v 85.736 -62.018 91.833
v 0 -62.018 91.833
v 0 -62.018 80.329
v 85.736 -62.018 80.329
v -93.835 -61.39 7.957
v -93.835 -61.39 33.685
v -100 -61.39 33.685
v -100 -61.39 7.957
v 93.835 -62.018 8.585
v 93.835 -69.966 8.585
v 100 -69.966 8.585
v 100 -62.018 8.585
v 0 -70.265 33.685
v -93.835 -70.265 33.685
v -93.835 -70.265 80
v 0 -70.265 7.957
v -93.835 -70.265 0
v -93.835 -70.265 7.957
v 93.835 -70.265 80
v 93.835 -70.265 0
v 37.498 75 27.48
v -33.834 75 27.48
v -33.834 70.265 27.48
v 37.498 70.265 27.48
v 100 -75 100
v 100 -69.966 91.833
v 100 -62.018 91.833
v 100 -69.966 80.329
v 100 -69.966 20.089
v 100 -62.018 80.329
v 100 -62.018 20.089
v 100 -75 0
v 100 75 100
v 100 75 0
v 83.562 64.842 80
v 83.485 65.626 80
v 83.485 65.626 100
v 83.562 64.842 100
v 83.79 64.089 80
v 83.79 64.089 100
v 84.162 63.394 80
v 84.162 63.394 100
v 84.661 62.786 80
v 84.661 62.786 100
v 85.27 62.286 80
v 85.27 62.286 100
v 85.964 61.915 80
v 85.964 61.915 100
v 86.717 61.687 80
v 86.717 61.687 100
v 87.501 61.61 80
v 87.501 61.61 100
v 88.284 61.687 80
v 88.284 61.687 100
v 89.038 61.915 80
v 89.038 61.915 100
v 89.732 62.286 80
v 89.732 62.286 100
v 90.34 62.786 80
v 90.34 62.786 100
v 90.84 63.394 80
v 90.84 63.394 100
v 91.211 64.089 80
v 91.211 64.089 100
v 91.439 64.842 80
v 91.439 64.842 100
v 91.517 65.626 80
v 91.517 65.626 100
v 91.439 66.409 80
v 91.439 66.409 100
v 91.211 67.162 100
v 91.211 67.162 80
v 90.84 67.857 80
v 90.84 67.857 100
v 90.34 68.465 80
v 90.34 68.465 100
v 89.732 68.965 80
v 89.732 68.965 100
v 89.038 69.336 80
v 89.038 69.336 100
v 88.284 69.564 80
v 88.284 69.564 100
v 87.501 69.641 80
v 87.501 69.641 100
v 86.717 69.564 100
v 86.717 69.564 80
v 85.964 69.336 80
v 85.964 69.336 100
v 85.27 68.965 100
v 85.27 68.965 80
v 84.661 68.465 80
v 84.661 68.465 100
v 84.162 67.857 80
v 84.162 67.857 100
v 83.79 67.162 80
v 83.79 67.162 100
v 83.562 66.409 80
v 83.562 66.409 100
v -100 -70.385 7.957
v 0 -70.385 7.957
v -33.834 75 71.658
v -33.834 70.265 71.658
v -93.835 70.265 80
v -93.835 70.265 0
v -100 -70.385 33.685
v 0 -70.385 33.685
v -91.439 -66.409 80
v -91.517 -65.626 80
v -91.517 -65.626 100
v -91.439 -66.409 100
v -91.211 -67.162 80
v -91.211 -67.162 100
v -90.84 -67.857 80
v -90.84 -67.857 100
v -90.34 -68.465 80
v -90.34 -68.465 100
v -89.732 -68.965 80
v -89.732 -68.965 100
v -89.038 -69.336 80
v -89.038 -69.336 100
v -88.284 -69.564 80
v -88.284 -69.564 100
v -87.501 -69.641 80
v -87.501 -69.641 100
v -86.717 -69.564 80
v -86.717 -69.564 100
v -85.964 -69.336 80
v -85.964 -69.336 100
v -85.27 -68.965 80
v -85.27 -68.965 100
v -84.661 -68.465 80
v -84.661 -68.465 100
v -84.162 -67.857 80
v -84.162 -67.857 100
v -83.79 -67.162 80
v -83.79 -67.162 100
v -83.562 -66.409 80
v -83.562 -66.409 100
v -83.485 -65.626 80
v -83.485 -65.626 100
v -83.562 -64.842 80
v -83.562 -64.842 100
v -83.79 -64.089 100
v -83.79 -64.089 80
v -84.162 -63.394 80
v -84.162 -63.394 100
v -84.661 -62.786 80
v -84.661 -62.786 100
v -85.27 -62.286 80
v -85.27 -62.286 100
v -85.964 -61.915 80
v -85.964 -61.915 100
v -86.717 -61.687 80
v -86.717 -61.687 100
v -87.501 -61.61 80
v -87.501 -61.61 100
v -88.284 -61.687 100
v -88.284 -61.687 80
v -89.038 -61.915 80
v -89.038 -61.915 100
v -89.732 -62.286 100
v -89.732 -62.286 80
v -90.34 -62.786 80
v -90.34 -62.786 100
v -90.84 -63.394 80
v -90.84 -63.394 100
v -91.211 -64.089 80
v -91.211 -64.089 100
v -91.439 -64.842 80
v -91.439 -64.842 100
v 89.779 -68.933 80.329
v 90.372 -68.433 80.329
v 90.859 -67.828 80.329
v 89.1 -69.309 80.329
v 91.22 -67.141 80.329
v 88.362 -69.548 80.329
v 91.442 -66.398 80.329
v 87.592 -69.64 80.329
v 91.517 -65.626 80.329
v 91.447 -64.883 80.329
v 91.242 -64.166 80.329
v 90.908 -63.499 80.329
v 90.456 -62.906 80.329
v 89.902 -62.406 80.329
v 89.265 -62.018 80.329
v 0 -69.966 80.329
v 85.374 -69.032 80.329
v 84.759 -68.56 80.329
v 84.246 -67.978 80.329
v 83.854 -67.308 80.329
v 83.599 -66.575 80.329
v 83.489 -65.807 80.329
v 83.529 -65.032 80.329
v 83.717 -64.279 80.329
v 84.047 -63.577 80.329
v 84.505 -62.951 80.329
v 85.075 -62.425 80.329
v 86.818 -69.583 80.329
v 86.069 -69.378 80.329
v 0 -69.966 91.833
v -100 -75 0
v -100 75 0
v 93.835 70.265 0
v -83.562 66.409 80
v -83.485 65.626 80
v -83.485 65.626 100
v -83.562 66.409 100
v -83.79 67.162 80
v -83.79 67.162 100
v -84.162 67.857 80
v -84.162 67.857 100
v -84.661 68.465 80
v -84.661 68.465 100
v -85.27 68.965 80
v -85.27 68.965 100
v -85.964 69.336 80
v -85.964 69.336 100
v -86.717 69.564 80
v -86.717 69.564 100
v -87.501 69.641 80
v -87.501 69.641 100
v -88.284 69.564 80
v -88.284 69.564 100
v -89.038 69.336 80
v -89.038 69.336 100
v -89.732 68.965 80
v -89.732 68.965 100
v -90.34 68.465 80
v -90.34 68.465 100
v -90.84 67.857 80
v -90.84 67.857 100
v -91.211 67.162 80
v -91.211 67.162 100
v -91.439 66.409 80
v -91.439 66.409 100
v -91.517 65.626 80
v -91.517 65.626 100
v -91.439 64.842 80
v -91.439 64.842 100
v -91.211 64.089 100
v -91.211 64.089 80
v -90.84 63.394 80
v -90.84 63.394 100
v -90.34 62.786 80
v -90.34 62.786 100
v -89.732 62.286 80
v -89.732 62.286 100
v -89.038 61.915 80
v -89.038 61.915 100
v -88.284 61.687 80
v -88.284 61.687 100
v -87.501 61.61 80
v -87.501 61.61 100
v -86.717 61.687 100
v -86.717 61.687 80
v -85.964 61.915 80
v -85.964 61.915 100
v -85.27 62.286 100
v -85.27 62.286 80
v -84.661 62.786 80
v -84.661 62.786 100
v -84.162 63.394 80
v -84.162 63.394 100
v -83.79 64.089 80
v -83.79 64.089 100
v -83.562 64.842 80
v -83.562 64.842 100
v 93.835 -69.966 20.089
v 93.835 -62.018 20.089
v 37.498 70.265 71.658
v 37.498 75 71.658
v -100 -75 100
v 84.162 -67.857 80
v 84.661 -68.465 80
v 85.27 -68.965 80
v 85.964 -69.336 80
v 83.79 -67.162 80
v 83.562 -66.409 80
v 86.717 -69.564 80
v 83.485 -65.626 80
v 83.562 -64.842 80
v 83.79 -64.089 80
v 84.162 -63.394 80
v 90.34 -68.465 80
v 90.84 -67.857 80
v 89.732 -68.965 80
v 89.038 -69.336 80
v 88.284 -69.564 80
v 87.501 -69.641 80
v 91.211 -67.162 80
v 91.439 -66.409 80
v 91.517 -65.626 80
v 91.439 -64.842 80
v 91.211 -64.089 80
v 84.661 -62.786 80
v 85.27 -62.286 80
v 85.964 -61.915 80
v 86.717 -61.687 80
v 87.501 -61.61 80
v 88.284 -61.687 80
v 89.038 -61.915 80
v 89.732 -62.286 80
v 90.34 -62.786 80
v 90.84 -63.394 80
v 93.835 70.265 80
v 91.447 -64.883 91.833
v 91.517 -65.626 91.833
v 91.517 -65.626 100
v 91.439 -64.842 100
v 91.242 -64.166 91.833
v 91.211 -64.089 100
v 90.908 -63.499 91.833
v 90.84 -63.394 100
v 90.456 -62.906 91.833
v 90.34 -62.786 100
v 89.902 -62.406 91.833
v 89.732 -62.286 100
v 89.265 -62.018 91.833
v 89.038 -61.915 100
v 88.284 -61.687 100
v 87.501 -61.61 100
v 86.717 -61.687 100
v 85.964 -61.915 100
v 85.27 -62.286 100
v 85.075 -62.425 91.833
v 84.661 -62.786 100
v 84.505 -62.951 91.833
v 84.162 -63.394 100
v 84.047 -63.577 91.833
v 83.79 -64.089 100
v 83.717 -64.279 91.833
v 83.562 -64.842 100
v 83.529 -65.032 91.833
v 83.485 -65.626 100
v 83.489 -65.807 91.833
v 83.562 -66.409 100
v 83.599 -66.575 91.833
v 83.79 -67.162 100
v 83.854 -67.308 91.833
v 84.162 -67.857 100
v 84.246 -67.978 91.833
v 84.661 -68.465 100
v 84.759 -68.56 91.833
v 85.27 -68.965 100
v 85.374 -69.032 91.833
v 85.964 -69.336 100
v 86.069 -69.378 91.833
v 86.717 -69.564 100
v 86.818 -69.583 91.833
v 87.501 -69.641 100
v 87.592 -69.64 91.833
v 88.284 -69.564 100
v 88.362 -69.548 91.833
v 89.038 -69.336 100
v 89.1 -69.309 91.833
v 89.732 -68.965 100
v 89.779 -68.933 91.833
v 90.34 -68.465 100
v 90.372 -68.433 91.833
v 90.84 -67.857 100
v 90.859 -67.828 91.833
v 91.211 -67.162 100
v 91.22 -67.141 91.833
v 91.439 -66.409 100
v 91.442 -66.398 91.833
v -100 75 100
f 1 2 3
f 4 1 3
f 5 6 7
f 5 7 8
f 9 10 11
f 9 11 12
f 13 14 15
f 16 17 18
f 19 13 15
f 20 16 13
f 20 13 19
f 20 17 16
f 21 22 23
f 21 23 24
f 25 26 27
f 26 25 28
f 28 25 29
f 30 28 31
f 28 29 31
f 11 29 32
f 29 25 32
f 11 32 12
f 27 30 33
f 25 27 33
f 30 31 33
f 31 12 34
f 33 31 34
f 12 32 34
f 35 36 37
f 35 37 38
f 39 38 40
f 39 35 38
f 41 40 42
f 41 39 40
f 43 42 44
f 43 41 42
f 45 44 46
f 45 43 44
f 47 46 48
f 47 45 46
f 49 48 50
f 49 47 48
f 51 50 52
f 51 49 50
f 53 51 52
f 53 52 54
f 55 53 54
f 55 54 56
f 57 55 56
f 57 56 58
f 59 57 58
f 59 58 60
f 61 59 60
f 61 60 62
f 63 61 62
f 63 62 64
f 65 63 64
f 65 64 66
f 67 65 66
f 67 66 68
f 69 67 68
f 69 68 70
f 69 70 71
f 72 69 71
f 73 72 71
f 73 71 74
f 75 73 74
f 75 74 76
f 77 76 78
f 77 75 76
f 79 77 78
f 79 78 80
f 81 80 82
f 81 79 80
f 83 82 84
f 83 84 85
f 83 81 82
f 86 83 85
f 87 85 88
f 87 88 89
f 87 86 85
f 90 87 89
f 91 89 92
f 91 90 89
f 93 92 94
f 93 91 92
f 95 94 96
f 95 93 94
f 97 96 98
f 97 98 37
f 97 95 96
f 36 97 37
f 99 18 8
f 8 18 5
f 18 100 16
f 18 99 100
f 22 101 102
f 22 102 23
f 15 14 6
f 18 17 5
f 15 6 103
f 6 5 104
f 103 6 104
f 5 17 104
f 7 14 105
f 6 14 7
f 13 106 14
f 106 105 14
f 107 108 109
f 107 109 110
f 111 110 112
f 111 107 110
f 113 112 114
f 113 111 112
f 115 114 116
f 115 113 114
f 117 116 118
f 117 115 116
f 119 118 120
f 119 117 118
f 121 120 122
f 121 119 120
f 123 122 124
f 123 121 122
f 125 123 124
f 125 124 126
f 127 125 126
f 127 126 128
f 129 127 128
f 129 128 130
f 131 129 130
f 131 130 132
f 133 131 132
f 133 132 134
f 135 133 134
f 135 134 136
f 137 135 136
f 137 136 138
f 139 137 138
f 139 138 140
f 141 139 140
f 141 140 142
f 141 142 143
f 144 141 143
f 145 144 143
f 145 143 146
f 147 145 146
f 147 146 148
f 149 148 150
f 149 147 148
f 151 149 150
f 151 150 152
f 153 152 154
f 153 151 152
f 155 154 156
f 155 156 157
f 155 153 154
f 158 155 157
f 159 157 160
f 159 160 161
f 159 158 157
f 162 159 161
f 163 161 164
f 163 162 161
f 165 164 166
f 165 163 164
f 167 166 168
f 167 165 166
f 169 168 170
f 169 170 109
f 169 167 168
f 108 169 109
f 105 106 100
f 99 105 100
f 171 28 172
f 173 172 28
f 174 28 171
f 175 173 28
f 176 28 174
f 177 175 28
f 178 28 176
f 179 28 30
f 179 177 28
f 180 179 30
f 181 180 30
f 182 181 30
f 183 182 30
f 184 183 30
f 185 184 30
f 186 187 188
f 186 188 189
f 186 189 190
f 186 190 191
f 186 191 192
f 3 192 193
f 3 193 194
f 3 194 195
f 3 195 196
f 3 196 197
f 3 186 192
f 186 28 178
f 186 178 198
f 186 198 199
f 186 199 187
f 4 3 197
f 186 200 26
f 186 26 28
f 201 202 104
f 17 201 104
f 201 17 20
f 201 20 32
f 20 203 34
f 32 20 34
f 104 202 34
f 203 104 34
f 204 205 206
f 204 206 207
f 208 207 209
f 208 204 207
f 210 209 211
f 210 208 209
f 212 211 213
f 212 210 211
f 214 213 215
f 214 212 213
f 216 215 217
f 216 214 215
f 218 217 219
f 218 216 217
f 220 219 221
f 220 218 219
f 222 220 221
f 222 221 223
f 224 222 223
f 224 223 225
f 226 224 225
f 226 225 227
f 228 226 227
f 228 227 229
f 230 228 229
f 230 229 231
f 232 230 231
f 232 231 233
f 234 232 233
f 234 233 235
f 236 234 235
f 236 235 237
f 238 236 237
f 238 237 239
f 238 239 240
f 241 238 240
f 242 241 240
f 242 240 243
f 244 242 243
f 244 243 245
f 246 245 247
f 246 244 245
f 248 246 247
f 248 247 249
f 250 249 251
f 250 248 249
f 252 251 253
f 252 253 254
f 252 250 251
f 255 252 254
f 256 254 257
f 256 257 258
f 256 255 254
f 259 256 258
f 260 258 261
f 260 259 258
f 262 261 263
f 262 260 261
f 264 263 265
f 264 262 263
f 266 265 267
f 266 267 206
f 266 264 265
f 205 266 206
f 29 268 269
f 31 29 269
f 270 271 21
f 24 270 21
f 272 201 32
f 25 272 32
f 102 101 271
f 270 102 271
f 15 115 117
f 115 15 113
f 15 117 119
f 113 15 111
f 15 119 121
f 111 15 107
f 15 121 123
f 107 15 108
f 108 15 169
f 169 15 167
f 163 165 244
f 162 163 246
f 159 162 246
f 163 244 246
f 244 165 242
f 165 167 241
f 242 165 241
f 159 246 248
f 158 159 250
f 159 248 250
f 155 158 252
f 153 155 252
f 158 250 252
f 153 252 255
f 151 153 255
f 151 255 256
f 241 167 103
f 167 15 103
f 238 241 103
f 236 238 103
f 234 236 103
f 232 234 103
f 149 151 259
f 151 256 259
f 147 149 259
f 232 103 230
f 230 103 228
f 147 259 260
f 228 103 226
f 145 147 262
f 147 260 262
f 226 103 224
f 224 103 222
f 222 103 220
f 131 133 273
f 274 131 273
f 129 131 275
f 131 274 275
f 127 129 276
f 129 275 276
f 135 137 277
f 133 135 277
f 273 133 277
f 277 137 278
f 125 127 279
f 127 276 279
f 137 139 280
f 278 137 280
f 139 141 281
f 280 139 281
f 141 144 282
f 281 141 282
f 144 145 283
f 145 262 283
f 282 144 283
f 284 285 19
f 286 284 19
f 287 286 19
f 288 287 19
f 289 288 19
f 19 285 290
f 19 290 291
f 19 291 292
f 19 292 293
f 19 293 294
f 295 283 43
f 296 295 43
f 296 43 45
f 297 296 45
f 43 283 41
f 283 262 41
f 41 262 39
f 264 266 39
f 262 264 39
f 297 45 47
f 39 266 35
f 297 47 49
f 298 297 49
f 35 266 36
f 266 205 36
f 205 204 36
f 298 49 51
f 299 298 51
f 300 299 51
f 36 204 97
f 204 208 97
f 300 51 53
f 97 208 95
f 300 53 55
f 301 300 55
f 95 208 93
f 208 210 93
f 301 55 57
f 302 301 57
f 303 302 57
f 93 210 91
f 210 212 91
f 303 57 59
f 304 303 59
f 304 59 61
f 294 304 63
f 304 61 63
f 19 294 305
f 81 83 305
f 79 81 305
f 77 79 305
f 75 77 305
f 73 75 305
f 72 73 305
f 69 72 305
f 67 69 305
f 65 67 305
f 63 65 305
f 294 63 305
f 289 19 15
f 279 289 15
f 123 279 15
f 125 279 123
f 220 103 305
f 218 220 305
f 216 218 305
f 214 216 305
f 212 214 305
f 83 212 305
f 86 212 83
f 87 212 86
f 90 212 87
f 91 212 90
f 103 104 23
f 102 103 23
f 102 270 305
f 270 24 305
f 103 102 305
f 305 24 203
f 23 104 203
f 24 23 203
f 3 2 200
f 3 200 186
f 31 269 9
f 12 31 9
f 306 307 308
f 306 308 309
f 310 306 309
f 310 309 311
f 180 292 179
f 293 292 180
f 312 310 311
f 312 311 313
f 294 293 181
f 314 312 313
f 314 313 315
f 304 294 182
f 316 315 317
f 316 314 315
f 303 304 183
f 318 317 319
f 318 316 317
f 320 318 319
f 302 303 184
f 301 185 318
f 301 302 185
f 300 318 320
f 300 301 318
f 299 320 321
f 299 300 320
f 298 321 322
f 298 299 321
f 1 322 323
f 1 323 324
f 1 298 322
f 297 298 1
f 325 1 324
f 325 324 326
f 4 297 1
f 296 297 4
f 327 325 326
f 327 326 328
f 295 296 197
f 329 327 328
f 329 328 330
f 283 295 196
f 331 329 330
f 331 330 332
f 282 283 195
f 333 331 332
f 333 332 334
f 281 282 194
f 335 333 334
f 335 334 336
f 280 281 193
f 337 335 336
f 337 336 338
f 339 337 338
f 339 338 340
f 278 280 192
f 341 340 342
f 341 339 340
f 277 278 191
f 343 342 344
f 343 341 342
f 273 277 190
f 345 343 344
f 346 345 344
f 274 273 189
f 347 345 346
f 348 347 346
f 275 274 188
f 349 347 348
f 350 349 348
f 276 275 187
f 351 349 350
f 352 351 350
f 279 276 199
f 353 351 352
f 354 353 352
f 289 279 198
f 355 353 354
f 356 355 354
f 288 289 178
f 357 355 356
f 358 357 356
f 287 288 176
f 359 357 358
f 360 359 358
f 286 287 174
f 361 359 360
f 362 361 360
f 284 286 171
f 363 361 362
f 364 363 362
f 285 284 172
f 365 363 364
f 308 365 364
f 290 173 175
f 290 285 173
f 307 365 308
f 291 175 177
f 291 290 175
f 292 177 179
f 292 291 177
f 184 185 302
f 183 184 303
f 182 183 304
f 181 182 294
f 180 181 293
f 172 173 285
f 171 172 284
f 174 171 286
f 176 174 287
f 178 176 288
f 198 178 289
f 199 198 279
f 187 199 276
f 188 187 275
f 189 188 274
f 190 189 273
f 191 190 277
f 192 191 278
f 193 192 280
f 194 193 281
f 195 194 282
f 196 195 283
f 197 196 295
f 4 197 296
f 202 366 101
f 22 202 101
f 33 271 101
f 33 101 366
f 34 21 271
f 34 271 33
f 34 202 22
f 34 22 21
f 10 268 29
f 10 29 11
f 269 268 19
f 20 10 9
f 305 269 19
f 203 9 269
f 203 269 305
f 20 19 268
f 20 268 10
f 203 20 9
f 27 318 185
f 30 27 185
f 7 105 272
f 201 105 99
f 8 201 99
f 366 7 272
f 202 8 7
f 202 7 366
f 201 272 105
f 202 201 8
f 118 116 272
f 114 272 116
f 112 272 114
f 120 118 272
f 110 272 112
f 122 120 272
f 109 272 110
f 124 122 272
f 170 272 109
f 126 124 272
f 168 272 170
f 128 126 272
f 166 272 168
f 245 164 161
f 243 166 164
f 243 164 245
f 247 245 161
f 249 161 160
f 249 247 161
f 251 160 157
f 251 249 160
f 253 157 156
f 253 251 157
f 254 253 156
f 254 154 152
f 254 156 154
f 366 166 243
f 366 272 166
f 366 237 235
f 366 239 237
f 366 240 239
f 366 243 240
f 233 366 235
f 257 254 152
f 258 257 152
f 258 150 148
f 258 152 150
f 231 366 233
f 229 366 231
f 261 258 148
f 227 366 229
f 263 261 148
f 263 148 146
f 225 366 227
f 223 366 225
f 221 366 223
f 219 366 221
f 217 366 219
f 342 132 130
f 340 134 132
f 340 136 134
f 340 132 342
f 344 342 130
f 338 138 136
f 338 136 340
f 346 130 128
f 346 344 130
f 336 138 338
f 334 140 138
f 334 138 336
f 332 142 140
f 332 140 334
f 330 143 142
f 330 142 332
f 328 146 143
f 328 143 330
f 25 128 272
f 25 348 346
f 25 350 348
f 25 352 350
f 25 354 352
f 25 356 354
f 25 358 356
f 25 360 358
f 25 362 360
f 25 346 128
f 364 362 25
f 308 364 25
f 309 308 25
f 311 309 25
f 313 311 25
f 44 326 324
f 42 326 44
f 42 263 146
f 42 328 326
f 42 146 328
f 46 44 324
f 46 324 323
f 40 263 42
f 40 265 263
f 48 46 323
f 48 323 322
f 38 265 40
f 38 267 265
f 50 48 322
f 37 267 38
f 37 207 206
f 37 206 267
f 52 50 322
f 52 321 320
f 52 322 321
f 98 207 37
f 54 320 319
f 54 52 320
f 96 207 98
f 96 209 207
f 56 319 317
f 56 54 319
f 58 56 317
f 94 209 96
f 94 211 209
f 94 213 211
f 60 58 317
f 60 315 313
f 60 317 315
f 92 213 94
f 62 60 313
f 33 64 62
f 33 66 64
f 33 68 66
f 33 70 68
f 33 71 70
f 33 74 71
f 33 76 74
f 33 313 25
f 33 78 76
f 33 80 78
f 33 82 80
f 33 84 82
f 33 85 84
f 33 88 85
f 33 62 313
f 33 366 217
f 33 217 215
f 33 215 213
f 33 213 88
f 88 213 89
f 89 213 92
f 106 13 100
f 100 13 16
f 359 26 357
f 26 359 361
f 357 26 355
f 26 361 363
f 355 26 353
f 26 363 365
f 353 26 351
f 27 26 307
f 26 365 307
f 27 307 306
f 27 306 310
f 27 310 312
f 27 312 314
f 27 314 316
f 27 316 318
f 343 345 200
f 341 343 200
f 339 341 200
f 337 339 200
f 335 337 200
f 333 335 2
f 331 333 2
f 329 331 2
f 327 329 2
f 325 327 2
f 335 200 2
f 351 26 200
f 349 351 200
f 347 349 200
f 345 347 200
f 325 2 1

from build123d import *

# Parameters (mm, degrees)
ESBO_O1_W                = 200
ESBO_O1_H                = 150
ESBO_O1_R                = 4.015931703
RESSALTO_EXTRUS_O1_DEPTH = 100
ESBO_O2_W                = 187.670035944
ESBO_O2_H                = 140.530338622
CORTE_EXTRUS_O2_DEPTH    = 80
ESBO_O3_W                = 25.727524856
ESBO_O3_H                = 8.994175356
CORTE_EXTRUS_O3_DEPTH    = 103
ESBO_O4_W                = 11.504177781
ESBO_O4_H                = 7.948341013
CORTE_EXTRUS_O4_DEPTH    = 114
ESBO_O5_W                = 71.332240634
ESBO_O5_H                = 44.178578037
CORTE_EXTRUS_O5_DEPTH    = 114


with BuildPart() as part:
    # Esboço1 → Ressalto-extrusão1 (new body)
    with BuildSketch(Plane.XY):
        Rectangle(ESBO_O1_W, ESBO_O1_H)
        with Locations((-87.500730847, 65.625548135)):
            Circle(ESBO_O1_R, mode=Mode.SUBTRACT)
        with Locations(Location((-87.500730847, -65.625548135, 0), (0, 0, 180))):
            Circle(ESBO_O1_R, mode=Mode.SUBTRACT)
        with Locations(Location((87.500730847, 65.625548135, 0), (0, 0, 180))):
            Circle(ESBO_O1_R, mode=Mode.SUBTRACT)
        with Locations((87.500730847, -65.625548135)):
            Circle(ESBO_O1_R, mode=Mode.SUBTRACT)
    extrude(amount=RESSALTO_EXTRUS_O1_DEPTH)

    # Esboço2 → Corte-extrusão2 (cut)
    with BuildSketch(Plane.XY):
        Rectangle(ESBO_O2_W, ESBO_O2_H)
    extrude(amount=CORTE_EXTRUS_O2_DEPTH, mode=Mode.SUBTRACT)

    # Esboço3 → Corte-extrusão3 (cut)
    with BuildSketch(Plane(origin=(0, 0, 0), x_dir=(0, 0, -1), z_dir=(1, 0, 0))):
        with Locations((-20.821221809, -65.887563657)):
            Rectangle(ESBO_O3_W, ESBO_O3_H)
    extrude(amount=-CORTE_EXTRUS_O3_DEPTH, mode=Mode.SUBTRACT)

    # Esboço4 → Corte-extrusão4 (cut)
    with BuildSketch(Plane(origin=(0, 0, 0), x_dir=(0, 0, -1), z_dir=(1, 0, 0))):
        with Locations((-86.08128486, -65.992147092)):
            Rectangle(ESBO_O4_W, ESBO_O4_H)
        with Locations((-14.337048878, -65.992147092)):
            Rectangle(ESBO_O4_W, ESBO_O4_H)
    extrude(amount=CORTE_EXTRUS_O4_DEPTH, mode=Mode.SUBTRACT)

    # Esboço5 → Corte-extrusão5 (cut)
    with BuildSketch(Plane(origin=(0, 75, 0), x_dir=(1, 0, 0), z_dir=(0, 1, 0))):
        with Locations((1.831794699, -49.568989483)):
            Rectangle(ESBO_O5_W, ESBO_O5_H)
    extrude(amount=-CORTE_EXTRUS_O5_DEPTH, mode=Mode.SUBTRACT)


solid = part.part
